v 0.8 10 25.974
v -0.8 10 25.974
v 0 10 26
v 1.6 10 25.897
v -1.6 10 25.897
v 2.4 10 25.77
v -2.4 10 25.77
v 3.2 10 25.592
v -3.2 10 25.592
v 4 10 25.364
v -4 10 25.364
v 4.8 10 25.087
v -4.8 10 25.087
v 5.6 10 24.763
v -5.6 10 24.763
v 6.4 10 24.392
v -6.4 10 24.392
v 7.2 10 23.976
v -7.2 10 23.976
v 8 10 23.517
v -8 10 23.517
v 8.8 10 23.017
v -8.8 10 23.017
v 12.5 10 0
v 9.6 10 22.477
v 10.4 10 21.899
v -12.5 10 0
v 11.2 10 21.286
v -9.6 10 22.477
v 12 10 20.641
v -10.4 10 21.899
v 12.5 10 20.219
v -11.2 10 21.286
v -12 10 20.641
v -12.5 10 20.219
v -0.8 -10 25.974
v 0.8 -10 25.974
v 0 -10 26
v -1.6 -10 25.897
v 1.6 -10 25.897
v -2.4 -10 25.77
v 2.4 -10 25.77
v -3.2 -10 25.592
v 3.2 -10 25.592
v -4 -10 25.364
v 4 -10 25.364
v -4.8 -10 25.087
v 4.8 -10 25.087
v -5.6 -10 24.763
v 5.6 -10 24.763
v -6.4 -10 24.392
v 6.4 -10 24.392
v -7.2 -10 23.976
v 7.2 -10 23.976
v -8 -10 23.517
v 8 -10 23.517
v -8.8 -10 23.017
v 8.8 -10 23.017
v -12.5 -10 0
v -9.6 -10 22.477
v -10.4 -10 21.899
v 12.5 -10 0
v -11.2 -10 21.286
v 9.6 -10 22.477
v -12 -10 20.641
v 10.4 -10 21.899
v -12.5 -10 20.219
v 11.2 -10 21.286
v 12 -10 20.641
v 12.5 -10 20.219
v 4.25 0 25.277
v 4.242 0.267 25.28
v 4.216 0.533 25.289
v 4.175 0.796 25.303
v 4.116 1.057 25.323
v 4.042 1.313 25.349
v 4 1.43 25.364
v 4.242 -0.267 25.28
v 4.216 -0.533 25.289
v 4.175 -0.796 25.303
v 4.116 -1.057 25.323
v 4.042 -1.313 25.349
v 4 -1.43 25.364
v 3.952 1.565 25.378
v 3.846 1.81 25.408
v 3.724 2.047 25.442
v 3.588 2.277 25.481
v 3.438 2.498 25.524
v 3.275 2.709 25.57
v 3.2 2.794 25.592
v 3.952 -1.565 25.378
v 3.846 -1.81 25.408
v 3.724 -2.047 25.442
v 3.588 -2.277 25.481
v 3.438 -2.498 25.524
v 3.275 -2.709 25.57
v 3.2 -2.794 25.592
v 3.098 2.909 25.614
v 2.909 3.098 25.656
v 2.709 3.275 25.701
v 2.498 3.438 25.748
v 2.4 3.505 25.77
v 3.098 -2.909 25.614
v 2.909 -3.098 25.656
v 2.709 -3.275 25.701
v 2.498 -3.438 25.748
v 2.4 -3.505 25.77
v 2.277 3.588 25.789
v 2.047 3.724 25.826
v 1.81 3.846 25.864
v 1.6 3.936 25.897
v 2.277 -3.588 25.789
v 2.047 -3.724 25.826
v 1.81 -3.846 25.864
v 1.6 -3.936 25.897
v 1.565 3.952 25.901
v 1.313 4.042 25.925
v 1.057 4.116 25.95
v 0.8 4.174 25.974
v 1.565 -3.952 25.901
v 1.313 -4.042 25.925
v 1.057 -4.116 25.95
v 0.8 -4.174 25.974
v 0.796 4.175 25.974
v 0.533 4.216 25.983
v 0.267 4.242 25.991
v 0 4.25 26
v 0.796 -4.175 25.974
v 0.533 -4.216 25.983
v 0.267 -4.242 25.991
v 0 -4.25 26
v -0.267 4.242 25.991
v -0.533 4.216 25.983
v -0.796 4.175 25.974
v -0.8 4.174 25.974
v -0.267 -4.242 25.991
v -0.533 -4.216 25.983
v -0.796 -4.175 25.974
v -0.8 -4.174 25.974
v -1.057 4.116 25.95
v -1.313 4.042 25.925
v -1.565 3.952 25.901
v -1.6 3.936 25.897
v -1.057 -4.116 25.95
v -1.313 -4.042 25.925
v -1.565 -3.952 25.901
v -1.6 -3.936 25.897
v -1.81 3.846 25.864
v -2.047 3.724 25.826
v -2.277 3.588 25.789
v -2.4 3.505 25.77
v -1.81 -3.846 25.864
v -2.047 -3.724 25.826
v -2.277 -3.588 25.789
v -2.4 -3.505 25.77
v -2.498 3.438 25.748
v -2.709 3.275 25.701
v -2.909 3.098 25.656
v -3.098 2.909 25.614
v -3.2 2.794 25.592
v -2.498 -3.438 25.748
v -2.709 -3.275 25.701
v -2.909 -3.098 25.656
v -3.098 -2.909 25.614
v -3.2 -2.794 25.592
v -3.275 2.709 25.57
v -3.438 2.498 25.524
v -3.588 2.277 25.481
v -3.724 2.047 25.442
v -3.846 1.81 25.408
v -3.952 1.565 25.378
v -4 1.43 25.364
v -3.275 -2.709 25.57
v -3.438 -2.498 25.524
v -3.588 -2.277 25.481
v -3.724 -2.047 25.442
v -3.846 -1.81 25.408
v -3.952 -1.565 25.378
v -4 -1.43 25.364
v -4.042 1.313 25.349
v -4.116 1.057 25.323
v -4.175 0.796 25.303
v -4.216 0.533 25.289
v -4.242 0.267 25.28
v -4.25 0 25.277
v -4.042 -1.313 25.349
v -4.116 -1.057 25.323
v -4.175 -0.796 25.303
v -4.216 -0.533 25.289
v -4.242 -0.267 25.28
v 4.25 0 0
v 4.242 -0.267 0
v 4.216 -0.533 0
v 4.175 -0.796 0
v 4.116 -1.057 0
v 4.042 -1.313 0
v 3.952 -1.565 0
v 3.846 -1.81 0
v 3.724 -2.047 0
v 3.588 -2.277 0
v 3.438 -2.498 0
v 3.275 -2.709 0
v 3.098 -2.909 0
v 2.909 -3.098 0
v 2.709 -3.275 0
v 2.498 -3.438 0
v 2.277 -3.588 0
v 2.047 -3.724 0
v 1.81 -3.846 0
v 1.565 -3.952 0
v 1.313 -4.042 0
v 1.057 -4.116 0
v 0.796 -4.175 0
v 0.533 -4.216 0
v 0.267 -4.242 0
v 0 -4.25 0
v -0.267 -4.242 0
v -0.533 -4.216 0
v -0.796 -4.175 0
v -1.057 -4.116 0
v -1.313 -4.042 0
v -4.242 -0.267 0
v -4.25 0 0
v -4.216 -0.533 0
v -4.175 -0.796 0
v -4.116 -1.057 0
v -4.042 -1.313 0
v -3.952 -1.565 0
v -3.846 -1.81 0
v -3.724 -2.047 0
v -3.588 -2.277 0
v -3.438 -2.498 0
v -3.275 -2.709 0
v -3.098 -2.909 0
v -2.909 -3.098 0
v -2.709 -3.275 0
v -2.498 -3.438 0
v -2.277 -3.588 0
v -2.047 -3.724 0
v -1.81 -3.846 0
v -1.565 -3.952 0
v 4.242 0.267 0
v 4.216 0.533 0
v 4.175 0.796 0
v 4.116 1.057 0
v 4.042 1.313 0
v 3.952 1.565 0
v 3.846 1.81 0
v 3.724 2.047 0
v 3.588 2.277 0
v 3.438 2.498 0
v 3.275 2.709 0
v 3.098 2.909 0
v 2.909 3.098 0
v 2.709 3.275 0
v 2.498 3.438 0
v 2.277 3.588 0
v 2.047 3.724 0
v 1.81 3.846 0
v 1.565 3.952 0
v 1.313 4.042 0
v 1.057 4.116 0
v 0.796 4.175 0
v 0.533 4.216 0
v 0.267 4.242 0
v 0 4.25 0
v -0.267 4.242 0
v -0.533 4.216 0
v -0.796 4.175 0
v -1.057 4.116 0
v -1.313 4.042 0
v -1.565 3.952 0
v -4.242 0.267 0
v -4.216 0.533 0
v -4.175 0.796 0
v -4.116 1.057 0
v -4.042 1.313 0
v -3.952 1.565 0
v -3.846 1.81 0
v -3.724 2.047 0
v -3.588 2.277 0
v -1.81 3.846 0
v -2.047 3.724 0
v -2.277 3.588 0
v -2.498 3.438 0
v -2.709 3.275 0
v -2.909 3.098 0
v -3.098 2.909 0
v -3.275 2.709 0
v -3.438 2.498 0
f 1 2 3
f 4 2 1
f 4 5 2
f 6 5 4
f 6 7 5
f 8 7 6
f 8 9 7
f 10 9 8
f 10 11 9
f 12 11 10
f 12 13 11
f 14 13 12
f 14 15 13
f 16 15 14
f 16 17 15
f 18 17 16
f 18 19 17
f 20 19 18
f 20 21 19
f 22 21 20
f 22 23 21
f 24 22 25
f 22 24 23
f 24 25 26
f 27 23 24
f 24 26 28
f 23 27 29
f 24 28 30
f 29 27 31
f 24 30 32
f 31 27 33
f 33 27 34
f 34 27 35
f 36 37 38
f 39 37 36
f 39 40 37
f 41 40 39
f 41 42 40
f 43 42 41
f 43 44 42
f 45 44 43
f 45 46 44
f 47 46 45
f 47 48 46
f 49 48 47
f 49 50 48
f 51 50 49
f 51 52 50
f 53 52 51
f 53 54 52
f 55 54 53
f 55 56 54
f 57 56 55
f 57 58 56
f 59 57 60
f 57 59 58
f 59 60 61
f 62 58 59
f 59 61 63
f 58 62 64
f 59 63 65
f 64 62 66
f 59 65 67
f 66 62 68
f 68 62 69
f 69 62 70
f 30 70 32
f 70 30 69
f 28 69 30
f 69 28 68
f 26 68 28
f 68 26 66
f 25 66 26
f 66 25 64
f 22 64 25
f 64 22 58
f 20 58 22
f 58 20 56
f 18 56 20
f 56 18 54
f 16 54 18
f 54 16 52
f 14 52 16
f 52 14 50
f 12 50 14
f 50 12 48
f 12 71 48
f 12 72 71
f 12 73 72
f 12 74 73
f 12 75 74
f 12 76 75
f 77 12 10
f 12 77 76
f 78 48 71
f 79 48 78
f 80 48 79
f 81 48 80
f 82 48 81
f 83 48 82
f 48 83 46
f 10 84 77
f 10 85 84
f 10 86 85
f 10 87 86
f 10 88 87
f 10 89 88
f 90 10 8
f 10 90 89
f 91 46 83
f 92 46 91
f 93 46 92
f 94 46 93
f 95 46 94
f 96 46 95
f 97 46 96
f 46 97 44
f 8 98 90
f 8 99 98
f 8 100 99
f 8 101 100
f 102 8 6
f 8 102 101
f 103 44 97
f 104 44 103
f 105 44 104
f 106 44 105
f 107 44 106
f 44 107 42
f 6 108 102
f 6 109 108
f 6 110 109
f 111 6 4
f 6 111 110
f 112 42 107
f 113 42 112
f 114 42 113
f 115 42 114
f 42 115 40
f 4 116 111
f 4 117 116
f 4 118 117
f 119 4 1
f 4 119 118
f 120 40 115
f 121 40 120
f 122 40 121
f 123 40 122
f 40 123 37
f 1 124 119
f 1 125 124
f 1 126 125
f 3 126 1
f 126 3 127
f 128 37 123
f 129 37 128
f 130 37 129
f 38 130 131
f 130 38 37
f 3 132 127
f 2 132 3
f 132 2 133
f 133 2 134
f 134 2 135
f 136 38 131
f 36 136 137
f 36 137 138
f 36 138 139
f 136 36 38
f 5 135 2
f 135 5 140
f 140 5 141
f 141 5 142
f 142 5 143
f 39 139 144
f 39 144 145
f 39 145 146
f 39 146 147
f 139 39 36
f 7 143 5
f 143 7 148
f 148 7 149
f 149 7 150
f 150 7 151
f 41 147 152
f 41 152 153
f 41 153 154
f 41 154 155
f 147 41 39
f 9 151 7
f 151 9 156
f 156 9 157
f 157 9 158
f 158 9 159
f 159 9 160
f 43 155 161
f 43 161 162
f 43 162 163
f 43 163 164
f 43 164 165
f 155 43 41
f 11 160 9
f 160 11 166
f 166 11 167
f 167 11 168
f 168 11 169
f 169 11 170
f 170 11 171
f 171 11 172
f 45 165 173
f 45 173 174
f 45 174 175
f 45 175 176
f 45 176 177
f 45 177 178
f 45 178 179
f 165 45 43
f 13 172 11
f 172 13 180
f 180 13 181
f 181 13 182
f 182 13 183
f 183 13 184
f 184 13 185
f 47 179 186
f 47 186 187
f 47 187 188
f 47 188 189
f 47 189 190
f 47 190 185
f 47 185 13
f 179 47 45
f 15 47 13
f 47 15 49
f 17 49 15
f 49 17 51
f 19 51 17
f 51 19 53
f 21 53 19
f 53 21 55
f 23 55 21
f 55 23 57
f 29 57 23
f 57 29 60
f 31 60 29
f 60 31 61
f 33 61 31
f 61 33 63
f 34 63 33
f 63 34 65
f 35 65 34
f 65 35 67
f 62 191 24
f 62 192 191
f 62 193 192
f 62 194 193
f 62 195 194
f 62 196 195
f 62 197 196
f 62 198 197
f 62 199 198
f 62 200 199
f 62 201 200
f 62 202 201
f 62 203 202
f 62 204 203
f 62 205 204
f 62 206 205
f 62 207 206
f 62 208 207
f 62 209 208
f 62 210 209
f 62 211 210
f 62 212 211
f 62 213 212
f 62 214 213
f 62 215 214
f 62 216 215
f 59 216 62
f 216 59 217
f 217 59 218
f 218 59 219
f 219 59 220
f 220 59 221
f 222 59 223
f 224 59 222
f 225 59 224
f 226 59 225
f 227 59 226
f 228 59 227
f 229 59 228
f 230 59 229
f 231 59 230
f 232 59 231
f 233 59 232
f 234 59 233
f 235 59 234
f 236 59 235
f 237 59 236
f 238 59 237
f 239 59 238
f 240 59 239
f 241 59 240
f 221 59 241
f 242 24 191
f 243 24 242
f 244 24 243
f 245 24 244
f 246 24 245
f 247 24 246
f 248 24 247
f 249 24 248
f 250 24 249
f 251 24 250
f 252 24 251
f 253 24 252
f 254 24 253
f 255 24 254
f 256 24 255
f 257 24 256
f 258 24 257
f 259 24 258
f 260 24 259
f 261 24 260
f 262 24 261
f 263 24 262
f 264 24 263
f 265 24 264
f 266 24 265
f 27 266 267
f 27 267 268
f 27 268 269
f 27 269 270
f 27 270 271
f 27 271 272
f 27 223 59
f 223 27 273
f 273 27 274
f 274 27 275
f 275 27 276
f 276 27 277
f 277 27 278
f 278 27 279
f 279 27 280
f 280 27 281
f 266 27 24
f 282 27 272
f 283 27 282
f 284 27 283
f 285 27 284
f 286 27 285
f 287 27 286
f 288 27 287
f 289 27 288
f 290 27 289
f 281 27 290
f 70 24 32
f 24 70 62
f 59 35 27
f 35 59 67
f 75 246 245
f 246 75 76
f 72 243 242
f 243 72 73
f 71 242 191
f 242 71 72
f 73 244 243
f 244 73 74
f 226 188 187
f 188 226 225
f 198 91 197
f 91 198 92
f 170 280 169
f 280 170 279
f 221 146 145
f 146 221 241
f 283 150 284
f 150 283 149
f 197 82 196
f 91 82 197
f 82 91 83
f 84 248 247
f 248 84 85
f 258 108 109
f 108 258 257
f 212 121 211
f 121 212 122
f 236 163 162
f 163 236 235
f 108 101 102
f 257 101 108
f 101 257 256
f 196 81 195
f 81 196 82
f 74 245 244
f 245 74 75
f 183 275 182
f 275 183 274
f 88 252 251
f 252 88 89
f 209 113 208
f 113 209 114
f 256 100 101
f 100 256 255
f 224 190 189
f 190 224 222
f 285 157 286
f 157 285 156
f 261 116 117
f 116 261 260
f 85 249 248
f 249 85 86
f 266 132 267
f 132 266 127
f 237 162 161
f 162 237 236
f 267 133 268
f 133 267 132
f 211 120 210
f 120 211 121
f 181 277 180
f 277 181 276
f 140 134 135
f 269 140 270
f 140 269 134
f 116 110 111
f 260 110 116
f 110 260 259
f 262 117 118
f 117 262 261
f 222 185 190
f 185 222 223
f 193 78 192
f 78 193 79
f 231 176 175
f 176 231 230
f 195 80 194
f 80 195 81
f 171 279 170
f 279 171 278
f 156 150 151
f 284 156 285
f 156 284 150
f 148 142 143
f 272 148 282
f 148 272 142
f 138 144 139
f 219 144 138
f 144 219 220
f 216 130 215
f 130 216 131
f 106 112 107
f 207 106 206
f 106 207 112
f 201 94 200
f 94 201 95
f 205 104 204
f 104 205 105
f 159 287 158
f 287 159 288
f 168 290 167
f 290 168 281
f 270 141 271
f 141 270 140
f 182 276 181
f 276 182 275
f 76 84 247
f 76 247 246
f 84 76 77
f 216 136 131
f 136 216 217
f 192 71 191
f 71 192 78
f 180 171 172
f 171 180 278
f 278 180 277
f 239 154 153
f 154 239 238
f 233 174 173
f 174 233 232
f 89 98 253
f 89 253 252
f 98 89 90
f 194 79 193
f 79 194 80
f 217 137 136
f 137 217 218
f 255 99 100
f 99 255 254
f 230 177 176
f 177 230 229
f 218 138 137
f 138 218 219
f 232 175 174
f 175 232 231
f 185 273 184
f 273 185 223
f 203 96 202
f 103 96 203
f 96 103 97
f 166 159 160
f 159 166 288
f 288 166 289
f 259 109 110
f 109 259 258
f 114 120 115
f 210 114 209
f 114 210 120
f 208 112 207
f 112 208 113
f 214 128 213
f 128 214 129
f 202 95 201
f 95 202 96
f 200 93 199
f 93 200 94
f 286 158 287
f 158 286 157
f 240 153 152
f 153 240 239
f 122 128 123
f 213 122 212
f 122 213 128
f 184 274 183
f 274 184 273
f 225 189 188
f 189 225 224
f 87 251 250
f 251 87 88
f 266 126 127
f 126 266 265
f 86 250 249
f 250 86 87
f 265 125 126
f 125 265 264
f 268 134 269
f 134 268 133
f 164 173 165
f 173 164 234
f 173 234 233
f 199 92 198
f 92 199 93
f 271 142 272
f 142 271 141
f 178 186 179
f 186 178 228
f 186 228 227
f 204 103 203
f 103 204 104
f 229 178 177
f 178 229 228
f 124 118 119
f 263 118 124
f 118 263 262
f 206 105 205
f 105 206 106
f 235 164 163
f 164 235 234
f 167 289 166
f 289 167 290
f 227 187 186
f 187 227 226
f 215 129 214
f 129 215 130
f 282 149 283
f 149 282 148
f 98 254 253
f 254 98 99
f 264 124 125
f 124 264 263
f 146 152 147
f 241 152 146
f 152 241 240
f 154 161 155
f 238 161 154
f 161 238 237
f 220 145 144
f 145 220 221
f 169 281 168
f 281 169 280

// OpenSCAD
/* [Wellblech-Eigenschaften / properties of corrugated sheet] */
// distance from top to top (or valley to valley)
distance = 78;
// height of profile
height = 26;
// depth of distance piece
depth = 20;
// residual_width of distance piece
width = 25;
// bore diameter
diameter_bore = 8.5;

$fn=100;

rotate([90,0,0])
difference() {
translate([0,height/2,-depth/2])
linear_extrude(height = depth)
  polygon(draw_cosinus(distance,height,$fn));

// subtract unnecessary parts of the profile
translate([width/2,-height/2,-depth])
  cube([distance*2,height*2,depth*2]);

// subtract unnecessary parts of the profile    
translate([-2*distance-width/2,-height/2,-depth])
  cube([distance*2,height*2,depth*2]);

// subtract the bore
translate([0,-height/2,0])
rotate([-90,0,0])
cylinder(r=diameter_bore/2,height*2);    
}


function draw_cosinus(width, height, steps) = 
  [for (i=[-steps/2:steps/2], a=i*360/steps) [i/steps*80,height/2 *cos(a)] ];
